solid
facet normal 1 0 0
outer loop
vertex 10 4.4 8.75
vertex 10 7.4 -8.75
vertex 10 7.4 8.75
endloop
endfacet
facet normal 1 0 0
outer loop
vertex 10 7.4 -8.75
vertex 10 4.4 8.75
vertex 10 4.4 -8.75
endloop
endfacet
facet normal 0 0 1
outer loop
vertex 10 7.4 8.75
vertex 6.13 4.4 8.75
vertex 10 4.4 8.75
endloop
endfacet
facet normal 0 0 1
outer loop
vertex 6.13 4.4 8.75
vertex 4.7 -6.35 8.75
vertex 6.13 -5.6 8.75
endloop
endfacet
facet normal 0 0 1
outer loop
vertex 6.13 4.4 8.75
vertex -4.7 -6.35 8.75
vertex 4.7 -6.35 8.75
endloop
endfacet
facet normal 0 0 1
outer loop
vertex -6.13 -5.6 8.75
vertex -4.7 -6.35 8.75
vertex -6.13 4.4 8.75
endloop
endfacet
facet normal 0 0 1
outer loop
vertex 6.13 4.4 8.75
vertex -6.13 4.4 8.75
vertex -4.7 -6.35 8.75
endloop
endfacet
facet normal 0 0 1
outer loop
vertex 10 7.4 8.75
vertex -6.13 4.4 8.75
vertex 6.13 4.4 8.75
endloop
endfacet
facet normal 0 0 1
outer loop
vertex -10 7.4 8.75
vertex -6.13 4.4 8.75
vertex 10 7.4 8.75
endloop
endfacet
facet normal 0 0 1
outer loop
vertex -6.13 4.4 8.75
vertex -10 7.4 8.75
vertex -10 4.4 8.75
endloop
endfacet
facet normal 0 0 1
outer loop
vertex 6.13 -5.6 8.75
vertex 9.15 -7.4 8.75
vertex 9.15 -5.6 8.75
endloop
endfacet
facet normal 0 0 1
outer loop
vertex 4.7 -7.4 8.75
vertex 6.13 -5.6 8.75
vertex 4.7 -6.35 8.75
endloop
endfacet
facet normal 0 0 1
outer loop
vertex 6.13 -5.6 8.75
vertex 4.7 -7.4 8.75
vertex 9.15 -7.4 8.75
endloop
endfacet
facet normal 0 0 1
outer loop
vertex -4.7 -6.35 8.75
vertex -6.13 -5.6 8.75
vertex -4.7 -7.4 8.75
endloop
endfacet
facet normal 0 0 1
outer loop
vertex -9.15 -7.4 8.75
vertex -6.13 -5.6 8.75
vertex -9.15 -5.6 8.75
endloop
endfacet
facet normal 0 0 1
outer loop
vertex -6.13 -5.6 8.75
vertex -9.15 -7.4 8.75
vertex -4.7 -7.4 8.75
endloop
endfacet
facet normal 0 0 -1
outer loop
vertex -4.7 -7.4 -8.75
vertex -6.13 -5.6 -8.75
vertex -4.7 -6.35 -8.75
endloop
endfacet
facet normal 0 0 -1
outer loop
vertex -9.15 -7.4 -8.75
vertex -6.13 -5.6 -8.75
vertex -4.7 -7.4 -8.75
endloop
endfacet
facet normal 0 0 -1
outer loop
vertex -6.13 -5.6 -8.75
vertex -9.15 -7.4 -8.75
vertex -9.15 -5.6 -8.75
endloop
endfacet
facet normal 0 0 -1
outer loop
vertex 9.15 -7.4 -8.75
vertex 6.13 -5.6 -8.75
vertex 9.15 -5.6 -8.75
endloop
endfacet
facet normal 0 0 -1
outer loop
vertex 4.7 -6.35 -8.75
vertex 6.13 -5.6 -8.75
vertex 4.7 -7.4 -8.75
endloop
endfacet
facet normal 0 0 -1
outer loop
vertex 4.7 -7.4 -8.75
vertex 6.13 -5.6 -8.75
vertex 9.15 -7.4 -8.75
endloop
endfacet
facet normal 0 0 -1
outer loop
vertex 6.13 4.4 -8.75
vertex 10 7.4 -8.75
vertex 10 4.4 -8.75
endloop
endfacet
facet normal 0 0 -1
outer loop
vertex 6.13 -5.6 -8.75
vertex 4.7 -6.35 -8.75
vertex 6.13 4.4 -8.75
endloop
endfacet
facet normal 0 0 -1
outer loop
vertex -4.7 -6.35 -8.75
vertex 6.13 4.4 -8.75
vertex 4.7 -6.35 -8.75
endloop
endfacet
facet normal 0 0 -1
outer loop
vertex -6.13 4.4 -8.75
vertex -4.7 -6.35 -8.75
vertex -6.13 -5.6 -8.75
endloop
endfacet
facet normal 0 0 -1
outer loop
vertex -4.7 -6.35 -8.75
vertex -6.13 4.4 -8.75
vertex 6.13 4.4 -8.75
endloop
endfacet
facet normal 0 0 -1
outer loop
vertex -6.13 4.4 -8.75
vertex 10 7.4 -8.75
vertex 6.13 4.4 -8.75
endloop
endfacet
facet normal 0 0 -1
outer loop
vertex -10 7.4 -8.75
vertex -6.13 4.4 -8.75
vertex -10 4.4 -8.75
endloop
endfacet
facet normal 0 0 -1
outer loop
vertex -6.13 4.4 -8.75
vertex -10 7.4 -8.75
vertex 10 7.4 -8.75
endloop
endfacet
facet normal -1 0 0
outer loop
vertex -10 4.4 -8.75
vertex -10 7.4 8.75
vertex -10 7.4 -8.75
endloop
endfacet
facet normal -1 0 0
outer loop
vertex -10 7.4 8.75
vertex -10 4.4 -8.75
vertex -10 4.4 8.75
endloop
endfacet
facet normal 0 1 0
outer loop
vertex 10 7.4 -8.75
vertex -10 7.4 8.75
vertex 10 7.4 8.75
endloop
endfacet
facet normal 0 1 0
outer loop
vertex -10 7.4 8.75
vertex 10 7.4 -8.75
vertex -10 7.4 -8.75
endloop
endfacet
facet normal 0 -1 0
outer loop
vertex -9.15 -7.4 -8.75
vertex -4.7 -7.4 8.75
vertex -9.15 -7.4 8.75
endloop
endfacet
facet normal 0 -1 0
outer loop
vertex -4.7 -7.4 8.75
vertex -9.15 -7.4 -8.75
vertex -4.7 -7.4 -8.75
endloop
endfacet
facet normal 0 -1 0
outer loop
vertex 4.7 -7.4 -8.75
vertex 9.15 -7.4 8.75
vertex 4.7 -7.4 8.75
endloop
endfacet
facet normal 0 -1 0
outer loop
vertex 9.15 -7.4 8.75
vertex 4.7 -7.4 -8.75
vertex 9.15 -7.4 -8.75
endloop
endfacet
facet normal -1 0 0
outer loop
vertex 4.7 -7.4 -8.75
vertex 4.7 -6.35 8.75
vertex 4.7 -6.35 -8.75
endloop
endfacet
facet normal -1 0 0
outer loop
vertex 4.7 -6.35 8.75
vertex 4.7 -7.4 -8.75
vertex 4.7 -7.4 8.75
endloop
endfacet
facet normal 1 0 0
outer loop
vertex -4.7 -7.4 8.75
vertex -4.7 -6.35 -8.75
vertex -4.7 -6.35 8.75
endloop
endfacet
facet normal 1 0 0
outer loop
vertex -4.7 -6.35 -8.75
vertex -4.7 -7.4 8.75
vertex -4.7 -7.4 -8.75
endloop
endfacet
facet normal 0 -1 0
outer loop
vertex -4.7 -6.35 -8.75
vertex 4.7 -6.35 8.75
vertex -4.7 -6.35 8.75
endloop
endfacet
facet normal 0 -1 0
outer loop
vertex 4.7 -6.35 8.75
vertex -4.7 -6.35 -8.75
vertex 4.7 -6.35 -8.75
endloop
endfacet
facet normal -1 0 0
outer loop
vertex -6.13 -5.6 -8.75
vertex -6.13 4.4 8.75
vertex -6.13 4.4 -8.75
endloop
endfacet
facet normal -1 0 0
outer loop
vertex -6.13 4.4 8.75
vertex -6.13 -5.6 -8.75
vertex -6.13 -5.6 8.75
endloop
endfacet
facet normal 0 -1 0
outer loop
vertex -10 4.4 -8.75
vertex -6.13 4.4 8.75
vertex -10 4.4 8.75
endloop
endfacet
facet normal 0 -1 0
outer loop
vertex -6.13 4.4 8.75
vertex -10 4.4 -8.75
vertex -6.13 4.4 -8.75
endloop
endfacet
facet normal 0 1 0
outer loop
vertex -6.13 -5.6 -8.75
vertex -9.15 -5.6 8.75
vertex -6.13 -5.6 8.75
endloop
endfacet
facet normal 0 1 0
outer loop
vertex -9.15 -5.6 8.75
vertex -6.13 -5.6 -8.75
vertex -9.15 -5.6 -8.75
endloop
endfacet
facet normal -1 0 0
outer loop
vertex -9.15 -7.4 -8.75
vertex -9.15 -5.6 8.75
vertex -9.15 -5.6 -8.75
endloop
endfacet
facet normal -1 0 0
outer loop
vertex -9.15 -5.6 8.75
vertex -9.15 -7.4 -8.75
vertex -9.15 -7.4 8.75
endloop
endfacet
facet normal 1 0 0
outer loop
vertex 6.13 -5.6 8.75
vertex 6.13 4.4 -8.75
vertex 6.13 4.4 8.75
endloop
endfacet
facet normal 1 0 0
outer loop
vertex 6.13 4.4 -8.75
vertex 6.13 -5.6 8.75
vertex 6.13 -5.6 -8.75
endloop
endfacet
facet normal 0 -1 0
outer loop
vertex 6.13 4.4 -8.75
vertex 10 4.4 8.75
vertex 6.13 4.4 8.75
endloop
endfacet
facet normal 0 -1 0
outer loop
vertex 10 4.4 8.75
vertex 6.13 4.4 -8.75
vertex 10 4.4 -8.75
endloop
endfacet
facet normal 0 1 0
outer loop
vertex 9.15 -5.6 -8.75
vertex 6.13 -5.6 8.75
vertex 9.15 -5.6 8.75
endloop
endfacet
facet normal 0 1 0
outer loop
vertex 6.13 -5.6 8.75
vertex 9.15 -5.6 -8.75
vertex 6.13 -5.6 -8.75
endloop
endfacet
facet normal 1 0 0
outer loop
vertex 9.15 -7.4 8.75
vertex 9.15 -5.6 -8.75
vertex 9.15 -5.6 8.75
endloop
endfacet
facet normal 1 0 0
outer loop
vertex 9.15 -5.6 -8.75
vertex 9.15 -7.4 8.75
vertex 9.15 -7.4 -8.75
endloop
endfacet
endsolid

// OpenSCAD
module hotshoemount() {

	difference() {

		cube([20,14.8,17.5], center=true);

		translate([0,-7.6,0]) {
			cube([9.4,2.5,17.5], center=true);
		}
	
		translate([-8.125,-0.60,0]) {
			cube([3.99,10,17.5], center=true);
		}
	
		translate([-9.65,-6.5,0]) {
			cube([1,2,17.9], center=true);
		}
	
	
		translate([8.125,-0.60,0]) {
			cube([3.99,10,17.5], center=true);
		}
	
		translate([9.65,-6.5,0]) {
			cube([1,2,17.9], center=true);
		}

	}


}


hotshoemount();
